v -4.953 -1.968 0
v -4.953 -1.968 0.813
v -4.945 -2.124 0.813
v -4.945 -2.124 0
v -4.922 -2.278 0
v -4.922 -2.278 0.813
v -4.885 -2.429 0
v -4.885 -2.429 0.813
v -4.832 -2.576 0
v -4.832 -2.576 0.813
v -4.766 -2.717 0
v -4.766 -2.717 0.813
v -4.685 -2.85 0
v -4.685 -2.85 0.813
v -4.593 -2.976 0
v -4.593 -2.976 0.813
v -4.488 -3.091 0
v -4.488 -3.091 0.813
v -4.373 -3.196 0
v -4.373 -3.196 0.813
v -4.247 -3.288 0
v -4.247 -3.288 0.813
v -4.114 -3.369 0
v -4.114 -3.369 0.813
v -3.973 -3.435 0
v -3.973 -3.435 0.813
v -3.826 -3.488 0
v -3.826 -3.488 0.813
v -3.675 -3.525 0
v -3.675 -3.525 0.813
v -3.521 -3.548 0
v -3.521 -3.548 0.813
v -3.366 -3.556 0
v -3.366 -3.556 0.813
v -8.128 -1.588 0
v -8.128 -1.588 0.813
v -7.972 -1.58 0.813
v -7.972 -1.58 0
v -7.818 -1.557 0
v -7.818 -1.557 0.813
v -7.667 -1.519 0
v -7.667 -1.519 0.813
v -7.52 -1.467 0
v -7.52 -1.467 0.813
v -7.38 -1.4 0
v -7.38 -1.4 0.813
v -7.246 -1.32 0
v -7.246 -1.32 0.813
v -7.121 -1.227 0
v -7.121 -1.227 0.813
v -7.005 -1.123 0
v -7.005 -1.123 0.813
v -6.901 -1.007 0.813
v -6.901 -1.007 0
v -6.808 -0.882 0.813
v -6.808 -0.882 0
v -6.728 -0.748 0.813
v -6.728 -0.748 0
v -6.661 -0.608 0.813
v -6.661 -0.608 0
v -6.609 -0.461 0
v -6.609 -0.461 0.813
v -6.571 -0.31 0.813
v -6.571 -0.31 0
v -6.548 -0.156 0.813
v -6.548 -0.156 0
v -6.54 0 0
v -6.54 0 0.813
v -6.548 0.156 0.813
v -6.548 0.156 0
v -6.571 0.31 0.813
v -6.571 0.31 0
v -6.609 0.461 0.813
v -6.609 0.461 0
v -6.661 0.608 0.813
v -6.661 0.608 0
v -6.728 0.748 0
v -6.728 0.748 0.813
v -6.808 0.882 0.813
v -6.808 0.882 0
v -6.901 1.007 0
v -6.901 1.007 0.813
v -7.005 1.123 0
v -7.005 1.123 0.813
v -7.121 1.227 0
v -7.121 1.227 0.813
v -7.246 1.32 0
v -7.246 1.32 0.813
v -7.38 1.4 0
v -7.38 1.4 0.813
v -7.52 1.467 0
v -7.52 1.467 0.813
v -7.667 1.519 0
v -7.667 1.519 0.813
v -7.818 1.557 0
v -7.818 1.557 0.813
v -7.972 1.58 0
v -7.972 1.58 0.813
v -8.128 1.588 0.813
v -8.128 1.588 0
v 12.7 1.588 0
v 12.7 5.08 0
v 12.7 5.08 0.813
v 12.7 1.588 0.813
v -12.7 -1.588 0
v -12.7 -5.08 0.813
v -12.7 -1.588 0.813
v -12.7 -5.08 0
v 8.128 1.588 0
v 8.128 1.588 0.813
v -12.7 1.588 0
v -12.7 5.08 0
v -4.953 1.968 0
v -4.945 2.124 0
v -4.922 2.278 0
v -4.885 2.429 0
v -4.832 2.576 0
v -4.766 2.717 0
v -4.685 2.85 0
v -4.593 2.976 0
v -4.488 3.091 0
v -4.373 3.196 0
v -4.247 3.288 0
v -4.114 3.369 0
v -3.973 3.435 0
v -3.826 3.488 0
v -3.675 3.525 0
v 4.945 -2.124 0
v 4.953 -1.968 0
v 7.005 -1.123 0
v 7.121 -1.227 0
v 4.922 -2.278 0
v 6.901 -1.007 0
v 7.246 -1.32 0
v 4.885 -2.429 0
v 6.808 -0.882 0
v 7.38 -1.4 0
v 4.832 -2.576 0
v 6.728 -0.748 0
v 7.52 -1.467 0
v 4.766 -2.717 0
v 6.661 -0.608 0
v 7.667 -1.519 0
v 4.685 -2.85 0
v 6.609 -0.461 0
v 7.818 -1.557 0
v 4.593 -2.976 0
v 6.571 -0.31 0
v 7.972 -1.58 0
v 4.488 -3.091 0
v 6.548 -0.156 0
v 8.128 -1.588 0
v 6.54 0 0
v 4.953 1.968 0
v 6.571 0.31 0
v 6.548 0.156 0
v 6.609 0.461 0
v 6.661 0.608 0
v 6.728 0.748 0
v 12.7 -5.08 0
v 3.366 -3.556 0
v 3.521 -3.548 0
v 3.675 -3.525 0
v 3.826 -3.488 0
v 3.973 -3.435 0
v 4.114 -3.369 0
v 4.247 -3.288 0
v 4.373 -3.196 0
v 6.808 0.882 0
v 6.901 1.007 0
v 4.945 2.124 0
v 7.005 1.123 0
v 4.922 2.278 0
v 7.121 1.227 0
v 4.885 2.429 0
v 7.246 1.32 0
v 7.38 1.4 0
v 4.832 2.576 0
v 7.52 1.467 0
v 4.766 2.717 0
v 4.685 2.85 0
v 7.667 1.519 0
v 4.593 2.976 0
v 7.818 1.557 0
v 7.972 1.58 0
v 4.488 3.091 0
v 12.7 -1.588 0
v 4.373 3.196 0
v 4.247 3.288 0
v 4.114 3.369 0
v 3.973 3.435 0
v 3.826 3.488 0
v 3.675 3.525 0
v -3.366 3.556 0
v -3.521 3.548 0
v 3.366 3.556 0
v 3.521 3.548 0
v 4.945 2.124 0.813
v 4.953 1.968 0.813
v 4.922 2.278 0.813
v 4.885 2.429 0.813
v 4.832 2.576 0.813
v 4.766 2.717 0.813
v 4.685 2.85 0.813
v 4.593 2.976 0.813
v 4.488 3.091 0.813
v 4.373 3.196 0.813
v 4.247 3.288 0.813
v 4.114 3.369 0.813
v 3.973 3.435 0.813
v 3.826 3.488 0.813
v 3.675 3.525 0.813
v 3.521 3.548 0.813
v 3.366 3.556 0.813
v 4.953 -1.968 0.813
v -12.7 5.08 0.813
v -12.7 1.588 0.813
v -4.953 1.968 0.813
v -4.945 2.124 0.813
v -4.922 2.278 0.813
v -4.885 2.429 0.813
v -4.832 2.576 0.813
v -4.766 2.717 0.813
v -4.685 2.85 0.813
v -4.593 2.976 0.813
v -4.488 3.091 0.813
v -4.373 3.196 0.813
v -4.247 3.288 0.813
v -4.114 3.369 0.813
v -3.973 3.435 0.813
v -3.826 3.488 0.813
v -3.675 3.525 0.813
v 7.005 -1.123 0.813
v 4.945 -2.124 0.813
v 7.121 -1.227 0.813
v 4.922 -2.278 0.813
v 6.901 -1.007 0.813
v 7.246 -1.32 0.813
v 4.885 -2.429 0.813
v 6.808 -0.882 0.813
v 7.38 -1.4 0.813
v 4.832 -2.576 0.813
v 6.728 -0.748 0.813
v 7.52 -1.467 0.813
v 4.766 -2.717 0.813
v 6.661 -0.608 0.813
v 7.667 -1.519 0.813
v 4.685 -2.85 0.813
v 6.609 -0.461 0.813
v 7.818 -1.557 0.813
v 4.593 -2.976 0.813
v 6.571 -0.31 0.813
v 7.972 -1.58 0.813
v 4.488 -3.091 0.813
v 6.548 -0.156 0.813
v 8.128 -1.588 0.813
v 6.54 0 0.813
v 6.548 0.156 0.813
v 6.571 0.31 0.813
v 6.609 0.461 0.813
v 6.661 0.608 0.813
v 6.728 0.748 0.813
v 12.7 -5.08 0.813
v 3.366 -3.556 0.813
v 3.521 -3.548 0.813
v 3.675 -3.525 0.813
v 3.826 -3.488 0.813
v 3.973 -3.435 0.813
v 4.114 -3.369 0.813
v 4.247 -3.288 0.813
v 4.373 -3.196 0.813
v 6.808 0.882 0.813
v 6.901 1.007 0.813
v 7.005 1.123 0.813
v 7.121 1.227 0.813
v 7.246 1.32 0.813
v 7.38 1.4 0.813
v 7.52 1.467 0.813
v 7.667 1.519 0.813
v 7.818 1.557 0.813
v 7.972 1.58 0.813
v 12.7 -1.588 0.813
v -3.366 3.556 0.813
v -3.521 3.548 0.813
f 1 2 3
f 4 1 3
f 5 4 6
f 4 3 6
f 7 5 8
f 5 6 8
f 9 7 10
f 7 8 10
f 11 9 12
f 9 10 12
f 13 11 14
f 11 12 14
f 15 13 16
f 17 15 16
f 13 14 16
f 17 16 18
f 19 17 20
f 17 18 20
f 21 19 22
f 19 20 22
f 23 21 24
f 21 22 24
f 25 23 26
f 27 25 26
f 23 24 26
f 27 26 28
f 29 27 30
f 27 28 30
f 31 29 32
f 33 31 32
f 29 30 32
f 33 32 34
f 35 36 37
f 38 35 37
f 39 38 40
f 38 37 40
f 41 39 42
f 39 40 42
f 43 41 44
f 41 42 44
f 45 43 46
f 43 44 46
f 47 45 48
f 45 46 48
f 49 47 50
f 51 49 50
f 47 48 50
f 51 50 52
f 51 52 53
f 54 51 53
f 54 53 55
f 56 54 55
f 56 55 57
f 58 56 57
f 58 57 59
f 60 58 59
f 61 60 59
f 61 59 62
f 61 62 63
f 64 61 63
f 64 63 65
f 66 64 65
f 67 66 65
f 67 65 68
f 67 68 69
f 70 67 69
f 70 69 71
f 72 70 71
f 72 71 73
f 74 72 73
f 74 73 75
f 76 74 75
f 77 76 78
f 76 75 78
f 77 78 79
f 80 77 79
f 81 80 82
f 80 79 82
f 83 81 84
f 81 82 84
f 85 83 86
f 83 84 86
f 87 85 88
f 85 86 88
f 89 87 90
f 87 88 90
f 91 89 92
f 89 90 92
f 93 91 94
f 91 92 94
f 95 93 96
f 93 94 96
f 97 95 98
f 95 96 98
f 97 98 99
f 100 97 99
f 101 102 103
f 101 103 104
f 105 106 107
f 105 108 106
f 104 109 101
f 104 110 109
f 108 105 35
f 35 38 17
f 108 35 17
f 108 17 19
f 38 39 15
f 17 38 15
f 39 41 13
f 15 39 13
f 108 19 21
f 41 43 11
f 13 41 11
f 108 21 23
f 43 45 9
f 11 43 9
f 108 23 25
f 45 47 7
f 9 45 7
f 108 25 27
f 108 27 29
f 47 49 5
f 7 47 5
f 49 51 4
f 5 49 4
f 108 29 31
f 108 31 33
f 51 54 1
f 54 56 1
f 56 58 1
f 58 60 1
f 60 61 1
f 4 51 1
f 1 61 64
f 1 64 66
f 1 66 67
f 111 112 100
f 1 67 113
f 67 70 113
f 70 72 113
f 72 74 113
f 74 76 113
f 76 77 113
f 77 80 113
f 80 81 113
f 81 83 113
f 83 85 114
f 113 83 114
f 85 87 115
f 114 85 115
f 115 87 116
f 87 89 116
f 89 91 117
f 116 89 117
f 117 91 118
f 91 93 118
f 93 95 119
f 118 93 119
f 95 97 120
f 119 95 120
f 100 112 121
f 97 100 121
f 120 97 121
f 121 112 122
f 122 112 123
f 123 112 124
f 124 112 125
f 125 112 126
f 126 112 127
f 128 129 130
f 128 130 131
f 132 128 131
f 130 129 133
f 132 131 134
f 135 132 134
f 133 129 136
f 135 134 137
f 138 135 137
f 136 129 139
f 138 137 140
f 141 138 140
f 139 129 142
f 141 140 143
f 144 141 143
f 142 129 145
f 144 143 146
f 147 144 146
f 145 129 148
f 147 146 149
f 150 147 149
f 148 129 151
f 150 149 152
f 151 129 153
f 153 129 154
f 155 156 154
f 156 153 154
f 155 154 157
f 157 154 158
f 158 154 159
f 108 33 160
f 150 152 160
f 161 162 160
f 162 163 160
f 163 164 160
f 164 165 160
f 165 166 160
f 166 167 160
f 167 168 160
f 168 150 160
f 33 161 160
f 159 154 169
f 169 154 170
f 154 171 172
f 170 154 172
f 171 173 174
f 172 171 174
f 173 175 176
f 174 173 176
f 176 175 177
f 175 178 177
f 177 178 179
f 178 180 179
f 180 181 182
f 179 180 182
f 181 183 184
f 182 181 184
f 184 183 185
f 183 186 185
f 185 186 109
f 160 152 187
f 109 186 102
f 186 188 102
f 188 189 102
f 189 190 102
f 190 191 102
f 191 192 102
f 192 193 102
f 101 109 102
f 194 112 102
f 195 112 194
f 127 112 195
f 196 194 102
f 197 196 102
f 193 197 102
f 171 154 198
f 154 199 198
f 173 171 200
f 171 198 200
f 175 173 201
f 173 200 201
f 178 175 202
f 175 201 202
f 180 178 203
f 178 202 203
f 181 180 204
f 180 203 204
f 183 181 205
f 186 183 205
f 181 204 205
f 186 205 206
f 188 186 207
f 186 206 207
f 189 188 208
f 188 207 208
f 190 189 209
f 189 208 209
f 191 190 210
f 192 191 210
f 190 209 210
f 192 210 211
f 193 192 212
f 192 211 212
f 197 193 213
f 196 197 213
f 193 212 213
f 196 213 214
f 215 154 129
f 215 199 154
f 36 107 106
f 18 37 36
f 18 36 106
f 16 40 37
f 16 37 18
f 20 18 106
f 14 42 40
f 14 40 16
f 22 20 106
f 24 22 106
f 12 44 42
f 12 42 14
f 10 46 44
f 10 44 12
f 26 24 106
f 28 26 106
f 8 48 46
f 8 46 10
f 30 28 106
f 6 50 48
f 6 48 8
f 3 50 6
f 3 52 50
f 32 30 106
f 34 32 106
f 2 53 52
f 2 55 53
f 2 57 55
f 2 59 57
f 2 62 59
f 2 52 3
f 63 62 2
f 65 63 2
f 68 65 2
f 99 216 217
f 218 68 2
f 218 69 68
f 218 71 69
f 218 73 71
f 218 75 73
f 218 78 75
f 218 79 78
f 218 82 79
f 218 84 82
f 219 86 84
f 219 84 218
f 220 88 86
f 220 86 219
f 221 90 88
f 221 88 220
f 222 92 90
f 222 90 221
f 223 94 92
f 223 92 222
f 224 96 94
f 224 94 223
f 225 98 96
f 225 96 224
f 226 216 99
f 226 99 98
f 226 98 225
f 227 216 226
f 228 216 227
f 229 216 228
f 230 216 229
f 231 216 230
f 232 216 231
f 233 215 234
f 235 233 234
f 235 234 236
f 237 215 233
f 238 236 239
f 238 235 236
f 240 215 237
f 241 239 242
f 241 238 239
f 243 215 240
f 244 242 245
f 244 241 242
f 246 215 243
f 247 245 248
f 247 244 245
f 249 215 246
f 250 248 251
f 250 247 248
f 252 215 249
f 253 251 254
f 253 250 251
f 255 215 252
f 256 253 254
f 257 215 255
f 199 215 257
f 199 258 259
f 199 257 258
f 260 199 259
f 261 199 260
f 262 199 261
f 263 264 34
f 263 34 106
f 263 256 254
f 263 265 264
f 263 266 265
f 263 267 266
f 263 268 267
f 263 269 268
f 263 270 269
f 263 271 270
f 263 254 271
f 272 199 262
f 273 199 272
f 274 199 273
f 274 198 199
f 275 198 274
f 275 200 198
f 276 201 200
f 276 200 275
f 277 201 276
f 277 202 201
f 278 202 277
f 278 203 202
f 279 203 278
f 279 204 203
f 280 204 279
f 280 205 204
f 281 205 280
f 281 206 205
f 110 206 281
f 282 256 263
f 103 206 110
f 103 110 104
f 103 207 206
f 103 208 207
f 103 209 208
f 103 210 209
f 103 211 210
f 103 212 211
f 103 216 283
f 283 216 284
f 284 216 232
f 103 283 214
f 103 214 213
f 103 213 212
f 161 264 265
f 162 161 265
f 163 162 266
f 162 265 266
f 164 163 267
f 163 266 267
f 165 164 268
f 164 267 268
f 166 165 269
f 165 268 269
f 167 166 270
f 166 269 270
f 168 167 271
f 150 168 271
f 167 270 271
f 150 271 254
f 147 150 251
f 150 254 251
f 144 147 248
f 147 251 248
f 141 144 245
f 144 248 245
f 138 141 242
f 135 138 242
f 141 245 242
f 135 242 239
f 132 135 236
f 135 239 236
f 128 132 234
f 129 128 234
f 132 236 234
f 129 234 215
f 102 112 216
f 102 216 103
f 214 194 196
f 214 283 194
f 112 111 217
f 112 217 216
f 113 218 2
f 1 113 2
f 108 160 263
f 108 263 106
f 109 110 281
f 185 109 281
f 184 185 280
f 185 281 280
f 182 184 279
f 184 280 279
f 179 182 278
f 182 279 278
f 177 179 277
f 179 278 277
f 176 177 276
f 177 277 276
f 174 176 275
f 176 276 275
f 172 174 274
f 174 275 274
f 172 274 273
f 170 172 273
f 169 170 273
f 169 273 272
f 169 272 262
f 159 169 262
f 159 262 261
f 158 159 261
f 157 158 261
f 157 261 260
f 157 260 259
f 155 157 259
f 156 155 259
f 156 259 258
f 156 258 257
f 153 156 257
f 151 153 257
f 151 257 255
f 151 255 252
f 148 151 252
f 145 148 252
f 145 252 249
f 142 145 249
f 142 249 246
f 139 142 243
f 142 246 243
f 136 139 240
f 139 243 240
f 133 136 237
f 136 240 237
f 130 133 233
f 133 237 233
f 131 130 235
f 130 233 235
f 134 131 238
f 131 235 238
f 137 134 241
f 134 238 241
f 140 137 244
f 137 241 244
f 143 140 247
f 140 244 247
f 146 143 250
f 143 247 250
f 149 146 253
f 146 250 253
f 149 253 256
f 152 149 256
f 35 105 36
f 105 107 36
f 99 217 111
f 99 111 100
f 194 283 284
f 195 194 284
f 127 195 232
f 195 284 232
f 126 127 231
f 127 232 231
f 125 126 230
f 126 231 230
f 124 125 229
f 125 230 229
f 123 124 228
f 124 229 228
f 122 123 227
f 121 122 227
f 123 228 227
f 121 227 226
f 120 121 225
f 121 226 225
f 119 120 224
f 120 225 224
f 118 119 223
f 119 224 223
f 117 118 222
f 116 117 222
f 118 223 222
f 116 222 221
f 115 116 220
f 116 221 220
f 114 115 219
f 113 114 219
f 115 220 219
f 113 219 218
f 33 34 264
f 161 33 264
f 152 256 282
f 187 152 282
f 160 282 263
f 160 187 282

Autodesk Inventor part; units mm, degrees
ref_plane "YZ Plane" through (0, 0, 0) normal (1, 0, 0) x (0, 1, 0)
ref_plane "XZ Plane" through (0, 0, 0) normal (0, 1, 0) x (-1, 0, 0)
sketch "Sketch1" plane through (0, 0, 0) normal (0, 0, 1) x (1, 0, 0)
  line L0 (-12.7, 5.08) -> (12.7, 5.08)
  line L1 (12.7, 5.08) -> (12.7, -5.08)
  line L2 (12.7, -5.08) -> (-12.7, -5.08)
  line L3 (-12.7, -5.08) -> (-12.7, 5.08)
  point P0 (0, 0)
  point P1 (0, 5.08)
  point P2 (-12.7, 0)
  dimension "d0" = 25.4
  dimension "d1" = 10.16
extrude "Extrusion1" add sketch "Sketch1" along normal blind 0.8128
ref_plane "Work Plane1" through (0, 0, 13.5128) normal (0, 0, 1) x (1, 0, 0)
sketch "Sketch2" plane through (0, 0, 13.5128) normal (0, 0, 1) x (1, 0, 0)
  line L0 (12.7, 5.08) -> (12.7, -5.08) projected
  line L1 (-12.7, 5.08) -> (12.7, 5.08) projected
  line L2 (-12.7, -5.08) -> (-12.7, 5.08) projected
  line L3 (12.7, -5.08) -> (-12.7, -5.08) projected
  line L4 (-3.3655, 3.556) -> (3.3655, 3.556)
  line L5 (-3.3655, -3.556) -> (3.3655, -3.556)
  line L6 (-4.953, 1.9685) -> (-4.953, -1.9685)
  line L7 (4.953, 1.9685) -> (4.953, -1.9685)
  arc A0 (-3.3655, 3.556) -> (-4.953, 1.9685) centre (-3.3655, 1.9685) ccw
  arc A1 (-4.953, -1.9685) -> (-3.3655, -3.556) centre (-3.3655, -1.9685) ccw
  arc A2 (3.3655, -3.556) -> (4.953, -1.9685) centre (3.3655, -1.9685) ccw
  arc A3 (4.953, 1.9685) -> (3.3655, 3.556) centre (3.3655, 1.9685) ccw
  point P0 (0, 0)
  point P1 (0, 3.556)
  point P2 (0, -3.556)
  point P3 (-4.953, 0)
  point P4 (4.953, 0)
  dimension "d5" = 6.731
  dimension "d6" = 6.731
  dimension "d7" = 3.937
  dimension "d8" = 3.937
  dimension "d9" = 4.953
  dimension "d10" = 4.953
  dimension "d11" = 3.556
  dimension "d12" = 3.556
  dimension "d13" = 1.5875
  dimension "d14" = 1.5875
  dimension "d15" = 1.5875
  dimension "d16" = 1.5875
extrude "Extrusion2" cut sketch "Sketch2" against normal blind 25.4 contours L4 A3 L7 A2 L5 A1 L6 A0
sketch "Sketch3" plane through (0, 0, 13.5128) normal (0, 0, 1) x (1, 0, 0)
  arc A0 (-3.3655, 3.556) -> (-4.953, 1.9685) centre (-3.3655, 1.9685) ccw projected
  line L0 (-3.3655, 3.556) -> (3.3655, 3.556) projected
  arc A1 (4.953, 1.9685) -> (3.3655, 3.556) centre (3.3655, 1.9685) ccw projected
  line L1 (4.953, 1.9685) -> (4.953, -1.9685) projected
  arc A2 (3.3655, -3.556) -> (4.953, -1.9685) centre (3.3655, -1.9685) ccw projected
  line L2 (3.3655, -3.556) -> (-3.3655, -3.556) projected
  arc A3 (-4.953, -1.9685) -> (-3.3655, -3.556) centre (-3.3655, -1.9685) ccw projected
  line L3 (-4.953, -1.9685) -> (-4.953, 1.9685) projected
  line L4 (12.7, 5.08) -> (12.7, -5.08) projected
  line L5 (-12.7, 5.08) -> (12.7, 5.08) projected
  line L6 (-12.7, -5.08) -> (-12.7, 5.08) projected
  line L7 (12.7, -5.08) -> (-12.7, -5.08) projected
  line L8 (-12.7, 1.5875) -> (-8.128, 1.5875)
  line L9 (-12.7, -1.5875) -> (-8.128, -1.5875)
  arc A4 (-8.128, -1.5875) -> (-8.128, 1.5875) centre (-8.128, 0) ccw
  point P0 (0, 0)
  dimension "d19" = 4.572
  dimension "d20" = 3.4925
  dimension "d21" = 4.572
  dimension "d22" = 3.175
  dimension "d24" = 1.5875
extrude "Extrusion3" cut sketch "Sketch3" against normal blind 25.4 contours L8 A4 L9 L6
mirror "Mirror1" about plane through (0, 0, 0) normal (1, 0, 0) of "Extrusion3"
properties part number "headplate_largerCenter"
